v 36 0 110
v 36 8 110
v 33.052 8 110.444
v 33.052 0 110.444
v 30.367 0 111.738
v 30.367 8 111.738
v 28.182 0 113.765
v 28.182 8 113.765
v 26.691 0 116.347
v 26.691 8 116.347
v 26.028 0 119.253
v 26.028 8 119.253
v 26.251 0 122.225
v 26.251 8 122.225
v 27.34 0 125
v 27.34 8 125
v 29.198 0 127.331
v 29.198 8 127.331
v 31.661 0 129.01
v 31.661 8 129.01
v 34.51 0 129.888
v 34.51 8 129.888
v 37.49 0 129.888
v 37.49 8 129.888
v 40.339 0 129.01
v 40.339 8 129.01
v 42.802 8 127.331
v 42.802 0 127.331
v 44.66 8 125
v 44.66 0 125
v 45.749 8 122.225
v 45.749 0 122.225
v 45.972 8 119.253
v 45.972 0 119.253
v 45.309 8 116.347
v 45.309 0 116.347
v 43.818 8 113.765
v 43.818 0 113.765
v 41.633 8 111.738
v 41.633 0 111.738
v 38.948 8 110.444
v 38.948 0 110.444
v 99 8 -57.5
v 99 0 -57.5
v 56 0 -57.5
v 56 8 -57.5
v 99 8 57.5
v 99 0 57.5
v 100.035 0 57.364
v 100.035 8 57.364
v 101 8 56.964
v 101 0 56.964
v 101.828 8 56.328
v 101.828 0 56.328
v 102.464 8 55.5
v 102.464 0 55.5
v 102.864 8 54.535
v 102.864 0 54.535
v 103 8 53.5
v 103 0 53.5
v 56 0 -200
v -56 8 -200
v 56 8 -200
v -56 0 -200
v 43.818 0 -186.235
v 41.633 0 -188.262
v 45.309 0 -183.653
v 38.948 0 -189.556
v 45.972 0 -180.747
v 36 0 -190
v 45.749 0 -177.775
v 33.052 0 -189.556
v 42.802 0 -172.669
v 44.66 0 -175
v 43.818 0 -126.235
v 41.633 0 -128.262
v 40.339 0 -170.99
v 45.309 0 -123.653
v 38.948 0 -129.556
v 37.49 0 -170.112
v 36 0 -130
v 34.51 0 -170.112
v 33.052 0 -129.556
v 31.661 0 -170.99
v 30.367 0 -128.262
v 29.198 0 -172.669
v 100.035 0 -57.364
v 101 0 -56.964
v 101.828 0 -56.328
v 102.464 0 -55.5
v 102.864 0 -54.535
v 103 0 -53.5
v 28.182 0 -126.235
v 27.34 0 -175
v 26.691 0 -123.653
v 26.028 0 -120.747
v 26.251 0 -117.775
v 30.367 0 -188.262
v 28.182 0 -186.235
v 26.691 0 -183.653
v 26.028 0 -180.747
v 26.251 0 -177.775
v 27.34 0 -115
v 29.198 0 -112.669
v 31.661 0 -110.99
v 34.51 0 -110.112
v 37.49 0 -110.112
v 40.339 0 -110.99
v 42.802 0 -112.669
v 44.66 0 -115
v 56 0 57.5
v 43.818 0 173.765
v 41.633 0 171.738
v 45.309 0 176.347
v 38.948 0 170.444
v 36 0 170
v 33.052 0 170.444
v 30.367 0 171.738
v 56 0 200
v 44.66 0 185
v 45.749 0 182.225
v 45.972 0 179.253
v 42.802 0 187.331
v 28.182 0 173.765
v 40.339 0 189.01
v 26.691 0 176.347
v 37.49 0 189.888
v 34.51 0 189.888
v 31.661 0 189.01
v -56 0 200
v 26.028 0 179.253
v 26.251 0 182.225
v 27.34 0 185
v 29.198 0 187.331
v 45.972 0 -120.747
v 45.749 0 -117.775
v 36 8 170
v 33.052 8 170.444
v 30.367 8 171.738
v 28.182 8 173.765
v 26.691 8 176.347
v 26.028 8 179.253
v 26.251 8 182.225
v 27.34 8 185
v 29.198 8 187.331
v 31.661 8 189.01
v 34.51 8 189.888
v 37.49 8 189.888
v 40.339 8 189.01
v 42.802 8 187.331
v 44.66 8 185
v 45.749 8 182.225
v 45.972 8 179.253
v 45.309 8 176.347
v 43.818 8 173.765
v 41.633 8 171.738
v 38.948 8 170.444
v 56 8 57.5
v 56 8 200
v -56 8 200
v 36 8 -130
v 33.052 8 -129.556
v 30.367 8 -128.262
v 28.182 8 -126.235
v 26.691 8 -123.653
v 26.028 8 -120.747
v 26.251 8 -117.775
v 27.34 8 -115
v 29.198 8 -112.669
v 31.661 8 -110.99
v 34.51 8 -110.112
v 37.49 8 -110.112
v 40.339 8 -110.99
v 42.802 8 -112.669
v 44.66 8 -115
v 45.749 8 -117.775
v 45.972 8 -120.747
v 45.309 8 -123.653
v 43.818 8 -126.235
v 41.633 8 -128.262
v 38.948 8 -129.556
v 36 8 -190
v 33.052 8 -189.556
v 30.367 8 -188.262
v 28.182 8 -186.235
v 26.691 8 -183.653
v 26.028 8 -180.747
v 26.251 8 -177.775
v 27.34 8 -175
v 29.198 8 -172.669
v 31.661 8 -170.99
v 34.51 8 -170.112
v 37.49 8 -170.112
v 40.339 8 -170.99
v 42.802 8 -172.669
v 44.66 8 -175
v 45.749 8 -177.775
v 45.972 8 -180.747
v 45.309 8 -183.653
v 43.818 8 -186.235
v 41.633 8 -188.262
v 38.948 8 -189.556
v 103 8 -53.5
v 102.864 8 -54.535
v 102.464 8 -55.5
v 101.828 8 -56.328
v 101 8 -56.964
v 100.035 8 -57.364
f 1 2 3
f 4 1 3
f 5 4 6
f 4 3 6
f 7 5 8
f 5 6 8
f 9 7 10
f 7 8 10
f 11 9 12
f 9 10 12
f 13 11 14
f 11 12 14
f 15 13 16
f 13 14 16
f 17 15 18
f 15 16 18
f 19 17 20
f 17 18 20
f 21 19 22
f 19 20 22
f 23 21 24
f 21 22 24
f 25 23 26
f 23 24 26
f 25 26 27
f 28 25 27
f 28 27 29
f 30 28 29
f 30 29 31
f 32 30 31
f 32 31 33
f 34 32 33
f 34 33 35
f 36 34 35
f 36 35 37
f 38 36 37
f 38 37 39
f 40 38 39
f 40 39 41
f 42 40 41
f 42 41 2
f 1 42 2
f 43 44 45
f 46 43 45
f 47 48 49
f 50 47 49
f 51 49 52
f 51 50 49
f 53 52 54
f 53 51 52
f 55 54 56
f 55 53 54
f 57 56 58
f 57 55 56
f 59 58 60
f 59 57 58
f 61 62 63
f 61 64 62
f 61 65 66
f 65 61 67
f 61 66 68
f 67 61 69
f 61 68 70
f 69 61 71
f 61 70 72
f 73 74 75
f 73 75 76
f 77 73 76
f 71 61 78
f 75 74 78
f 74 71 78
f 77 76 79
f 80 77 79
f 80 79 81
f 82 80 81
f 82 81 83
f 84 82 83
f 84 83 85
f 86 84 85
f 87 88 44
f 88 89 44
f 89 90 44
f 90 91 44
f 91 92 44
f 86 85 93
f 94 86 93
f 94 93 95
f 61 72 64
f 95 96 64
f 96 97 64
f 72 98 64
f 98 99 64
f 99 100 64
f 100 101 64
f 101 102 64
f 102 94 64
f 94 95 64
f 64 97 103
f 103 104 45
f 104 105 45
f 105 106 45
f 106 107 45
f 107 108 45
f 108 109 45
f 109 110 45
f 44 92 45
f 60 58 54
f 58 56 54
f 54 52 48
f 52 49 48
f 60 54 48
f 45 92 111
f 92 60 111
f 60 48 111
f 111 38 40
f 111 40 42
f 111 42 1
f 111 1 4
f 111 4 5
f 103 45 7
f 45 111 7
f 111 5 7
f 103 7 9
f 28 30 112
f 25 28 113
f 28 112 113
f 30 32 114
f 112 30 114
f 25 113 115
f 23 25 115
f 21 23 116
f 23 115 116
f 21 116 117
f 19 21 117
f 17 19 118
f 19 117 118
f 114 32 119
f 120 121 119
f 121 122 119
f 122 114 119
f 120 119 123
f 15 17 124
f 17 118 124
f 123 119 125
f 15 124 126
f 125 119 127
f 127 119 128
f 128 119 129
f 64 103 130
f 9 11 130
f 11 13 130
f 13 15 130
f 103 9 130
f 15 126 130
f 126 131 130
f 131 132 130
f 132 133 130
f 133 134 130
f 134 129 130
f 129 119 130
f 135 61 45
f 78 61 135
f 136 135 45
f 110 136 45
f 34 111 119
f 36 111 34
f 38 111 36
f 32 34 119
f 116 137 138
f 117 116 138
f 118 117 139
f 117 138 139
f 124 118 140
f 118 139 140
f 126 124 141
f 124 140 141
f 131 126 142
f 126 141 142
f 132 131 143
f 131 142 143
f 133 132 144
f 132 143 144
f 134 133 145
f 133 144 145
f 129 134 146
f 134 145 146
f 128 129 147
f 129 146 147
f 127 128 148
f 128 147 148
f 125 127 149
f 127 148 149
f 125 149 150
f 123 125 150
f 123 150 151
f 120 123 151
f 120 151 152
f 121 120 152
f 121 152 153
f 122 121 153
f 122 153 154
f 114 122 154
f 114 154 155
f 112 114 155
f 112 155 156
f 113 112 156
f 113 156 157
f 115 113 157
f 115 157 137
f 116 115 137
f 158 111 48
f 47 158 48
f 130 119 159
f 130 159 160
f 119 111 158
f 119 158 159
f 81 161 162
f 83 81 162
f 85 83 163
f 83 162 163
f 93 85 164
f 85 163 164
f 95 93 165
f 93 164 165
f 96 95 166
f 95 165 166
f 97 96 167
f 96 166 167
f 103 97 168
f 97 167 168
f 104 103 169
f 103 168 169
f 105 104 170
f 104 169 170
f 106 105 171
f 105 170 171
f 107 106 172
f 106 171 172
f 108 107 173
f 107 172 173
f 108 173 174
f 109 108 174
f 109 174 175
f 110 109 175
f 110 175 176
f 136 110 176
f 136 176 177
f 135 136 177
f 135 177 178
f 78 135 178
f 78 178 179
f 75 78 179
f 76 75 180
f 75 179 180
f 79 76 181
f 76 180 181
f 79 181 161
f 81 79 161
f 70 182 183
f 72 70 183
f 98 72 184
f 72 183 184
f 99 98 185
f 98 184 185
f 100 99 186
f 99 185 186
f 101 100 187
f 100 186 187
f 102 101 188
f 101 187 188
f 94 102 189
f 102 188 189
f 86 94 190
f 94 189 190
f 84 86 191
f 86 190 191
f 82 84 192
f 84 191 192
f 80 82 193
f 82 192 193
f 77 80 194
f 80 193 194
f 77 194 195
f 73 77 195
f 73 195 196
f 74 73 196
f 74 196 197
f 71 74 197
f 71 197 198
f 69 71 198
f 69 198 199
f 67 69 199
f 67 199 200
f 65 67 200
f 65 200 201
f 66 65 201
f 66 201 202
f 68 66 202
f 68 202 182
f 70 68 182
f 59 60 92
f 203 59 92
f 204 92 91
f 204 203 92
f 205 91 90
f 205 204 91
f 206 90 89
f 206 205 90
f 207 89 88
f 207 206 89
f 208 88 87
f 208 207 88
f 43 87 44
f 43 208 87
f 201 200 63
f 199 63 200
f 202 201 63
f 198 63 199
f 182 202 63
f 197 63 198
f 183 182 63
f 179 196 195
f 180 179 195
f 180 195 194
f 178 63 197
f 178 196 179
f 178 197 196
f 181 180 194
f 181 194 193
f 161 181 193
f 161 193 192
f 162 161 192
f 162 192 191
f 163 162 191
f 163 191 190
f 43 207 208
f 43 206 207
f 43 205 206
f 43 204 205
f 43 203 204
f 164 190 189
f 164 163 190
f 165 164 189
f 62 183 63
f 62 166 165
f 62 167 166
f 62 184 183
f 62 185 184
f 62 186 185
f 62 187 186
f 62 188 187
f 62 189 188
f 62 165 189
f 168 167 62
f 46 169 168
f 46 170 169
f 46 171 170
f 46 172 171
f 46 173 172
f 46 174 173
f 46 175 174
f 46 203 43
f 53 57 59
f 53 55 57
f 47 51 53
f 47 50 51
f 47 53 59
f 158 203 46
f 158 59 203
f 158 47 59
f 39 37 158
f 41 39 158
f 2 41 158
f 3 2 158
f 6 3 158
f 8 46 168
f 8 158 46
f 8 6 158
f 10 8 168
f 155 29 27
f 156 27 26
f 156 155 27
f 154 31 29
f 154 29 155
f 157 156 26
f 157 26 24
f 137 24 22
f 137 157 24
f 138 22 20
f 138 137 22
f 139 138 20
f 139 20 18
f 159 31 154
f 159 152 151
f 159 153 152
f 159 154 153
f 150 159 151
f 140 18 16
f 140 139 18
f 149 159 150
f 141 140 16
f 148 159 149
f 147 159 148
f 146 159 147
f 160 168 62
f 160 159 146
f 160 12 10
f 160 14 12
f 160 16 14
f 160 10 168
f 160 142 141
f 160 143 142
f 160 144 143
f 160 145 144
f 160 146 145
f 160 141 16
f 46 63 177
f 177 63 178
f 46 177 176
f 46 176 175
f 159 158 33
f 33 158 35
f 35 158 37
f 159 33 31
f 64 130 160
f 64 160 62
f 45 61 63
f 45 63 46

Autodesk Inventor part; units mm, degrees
ref_plane "YZ Plane" through (0, 0, 0) normal (1, 0, 0) x (0, 1, 0)
ref_plane "XZ Plane" through (0, 0, 0) normal (0, 1, 0) x (-1, 0, 0)
ref_plane "XY Plane" through (0, 0, 0) normal (0, 0, 1) x (1, 0, 0)
sketch "Sketch1" plane through (0, 0, 0) normal (0, 1, 0) x (-1, 0, 0)
  line L0 (56, -200) -> (-56, -200)
  line L1 (-56, -200) -> (-56, 200)
  line L2 (-56, 200) -> (56, 200)
  line L3 (56, 200) -> (56, -200)
  line L4 (56, -200) -> (-56, 200) construction
  line L5 (-56, -200) -> (56, 200) construction
  line L6 (-56, 57.5) -> (-103, 57.5)
  line L7 (-103, 57.5) -> (-103, -57.5)
  line L8 (-103, -57.5) -> (-56, -57.5)
  point P0 (0, 0)
  point P1 (0, 0)
  point P2 (-103, 0)
  point P3 (-56, 0)
  dimension "d16" = 112
  dimension "d17" = 400
  dimension "d24" = 47
  dimension "d25" = 115
extrude "Plate1" add sketch "Sketch1" along normal blind 8
sketch "Sketch2" plane through (0, 0, 0) normal (0, -1, 0) x (1, 0, 0)
  line L0 (36, 180) -> (36, -180) construction
  line L1 (-56, -200) -> (56, -200) projected
  line L2 (56, -200) -> (56, -57.5) projected
  line L3 (56, 200) -> (-56, 200) projected
  line L4 (-56, 200) -> (-56, -200) projected
  line L5 (103, -57.5) -> (56, -57.5) projected
  line L6 (103, 57.5) -> (103, -57.5) projected
  line L7 (56, 57.5) -> (103, 57.5) projected
  line L8 (56, 57.5) -> (56, 200) projected
  point P0 (36, 0)
  point P1 (36, 0)
  point P2 (0, 0)
  point P3 (36, 120)
  point P4 (36, -120)
  dimension "d19" = 20
  dimension "d20" = 20
  dimension "d21" = 360
  dimension "d22" = 120
  dimension "d23" = 120
hole "Hole1" at (36, 0, 180) at (36, 0, -180) at (36, 0, -120) at (36, 0, 120) direction (0, 1, 0) diameter 20 end through all
fillet "Fillet1" radius 4 2 edges at (103, 4, 57.5) (103, 4, -57.5)
equation "\"d20\" = d19"
equation "\"d22\" = d23"
equation "\"d3\" = d19"
equation "\"d8\" = Thickness"
equation "\"d2\" = Thickness"
equation "\"BendRadius\" = Thickness"
equation "\"BendReliefWidth\" = Thickness"
equation "\"BendReliefDepth\" = 0.5 * Thickness"
equation "\"CornerReliefSize\" = 4 * Thickness"
equation "\"MinimumRemnant\" = 2 * Thickness"
equation "\"TransitionRadius\" = BendRadius"
equation "\"JacobiRadiusSize\" = BendRadius"
equation "\"GapSize\" = Thickness"
equation "\"Thickness\" = 8"
properties part number "Ухо на швеллер пямое_CPY"
